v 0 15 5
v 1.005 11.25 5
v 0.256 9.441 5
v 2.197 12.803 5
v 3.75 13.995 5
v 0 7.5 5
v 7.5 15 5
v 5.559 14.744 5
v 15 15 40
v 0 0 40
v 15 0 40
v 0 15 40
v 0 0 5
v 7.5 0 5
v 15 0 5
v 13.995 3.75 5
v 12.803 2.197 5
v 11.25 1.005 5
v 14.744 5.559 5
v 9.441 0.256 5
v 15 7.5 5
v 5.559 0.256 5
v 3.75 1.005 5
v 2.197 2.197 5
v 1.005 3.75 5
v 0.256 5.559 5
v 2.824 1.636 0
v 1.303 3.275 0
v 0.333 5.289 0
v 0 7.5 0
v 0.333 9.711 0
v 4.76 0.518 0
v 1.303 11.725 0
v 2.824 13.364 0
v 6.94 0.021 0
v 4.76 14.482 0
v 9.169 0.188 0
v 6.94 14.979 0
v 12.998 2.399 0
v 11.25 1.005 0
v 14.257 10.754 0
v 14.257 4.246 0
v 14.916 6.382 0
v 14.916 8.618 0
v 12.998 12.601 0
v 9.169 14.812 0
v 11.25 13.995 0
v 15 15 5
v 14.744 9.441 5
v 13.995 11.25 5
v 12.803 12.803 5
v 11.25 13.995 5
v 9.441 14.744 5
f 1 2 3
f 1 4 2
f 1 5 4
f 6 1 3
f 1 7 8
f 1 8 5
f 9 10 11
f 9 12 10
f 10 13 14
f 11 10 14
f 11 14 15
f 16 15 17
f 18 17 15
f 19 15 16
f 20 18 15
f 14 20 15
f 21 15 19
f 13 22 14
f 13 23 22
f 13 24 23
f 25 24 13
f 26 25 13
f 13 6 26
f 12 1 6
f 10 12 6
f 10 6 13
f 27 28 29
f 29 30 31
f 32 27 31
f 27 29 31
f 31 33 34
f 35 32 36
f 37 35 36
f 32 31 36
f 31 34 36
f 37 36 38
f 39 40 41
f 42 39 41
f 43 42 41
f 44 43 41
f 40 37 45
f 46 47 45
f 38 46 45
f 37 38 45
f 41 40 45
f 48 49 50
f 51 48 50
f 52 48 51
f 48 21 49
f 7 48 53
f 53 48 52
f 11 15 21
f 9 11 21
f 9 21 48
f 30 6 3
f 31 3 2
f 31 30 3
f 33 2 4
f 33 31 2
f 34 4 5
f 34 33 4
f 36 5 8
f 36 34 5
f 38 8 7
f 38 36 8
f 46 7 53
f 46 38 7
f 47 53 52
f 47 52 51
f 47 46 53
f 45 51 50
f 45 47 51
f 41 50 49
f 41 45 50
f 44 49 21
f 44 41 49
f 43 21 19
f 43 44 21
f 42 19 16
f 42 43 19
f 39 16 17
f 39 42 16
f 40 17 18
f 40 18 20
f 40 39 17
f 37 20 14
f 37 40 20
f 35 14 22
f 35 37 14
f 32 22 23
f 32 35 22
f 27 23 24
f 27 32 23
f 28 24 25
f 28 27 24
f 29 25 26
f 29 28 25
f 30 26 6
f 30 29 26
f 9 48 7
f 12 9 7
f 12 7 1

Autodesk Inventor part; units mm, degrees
ref_plane "YZ Plane" through (0, 0, 0) normal (1, 0, 0) x (0, 1, 0)
ref_plane "XZ Plane" through (0, 0, 0) normal (0, 1, 0) x (-1, 0, 0)
ref_plane "XY Plane" through (0, 0, 0) normal (0, 0, 1) x (1, 0, 0)
sketch "Sketch1" plane through (0, 0, 0) normal (0, 0, 1) x (1, 0, 0)
  line L0 (0, 0) -> (15, 0)
  line L1 (15, 0) -> (15, 15)
  line L2 (15, 15) -> (0, 15)
  line L3 (0, 15) -> (0, 0)
  dimension "d0" = 15
  dimension "d1" = 15
extrude "Extrusion1" add sketch "Sketch1" along normal blind 40
sketch "Sketch2" plane through (0, 0, 0) normal (0, 0, -1) x (-1, 0, 0)
  circle A0 centre (-7.5, 7.5) radius 7.5
  line L0 (-15, 15) -> (0, 15)
  line L1 (0, 15) -> (0, 0)
  line L2 (0, 0) -> (-15, 0)
  line L3 (-15, 0) -> (-15, 15)
  line L4 (-15, 15) -> (0, 15) projected
  line L5 (0, 0) -> (-15, 0) projected
  line L6 (0, 15) -> (0, 0) projected
  line L7 (-15, 0) -> (-15, 15) projected
extrude "Extrusion2" cut sketch "Sketch2" against normal blind 5 contours L1 L2 A0 | A0 L0 L1 | A0 L3 L0 | L2 L3 A0
properties part number "EF-Arm"
